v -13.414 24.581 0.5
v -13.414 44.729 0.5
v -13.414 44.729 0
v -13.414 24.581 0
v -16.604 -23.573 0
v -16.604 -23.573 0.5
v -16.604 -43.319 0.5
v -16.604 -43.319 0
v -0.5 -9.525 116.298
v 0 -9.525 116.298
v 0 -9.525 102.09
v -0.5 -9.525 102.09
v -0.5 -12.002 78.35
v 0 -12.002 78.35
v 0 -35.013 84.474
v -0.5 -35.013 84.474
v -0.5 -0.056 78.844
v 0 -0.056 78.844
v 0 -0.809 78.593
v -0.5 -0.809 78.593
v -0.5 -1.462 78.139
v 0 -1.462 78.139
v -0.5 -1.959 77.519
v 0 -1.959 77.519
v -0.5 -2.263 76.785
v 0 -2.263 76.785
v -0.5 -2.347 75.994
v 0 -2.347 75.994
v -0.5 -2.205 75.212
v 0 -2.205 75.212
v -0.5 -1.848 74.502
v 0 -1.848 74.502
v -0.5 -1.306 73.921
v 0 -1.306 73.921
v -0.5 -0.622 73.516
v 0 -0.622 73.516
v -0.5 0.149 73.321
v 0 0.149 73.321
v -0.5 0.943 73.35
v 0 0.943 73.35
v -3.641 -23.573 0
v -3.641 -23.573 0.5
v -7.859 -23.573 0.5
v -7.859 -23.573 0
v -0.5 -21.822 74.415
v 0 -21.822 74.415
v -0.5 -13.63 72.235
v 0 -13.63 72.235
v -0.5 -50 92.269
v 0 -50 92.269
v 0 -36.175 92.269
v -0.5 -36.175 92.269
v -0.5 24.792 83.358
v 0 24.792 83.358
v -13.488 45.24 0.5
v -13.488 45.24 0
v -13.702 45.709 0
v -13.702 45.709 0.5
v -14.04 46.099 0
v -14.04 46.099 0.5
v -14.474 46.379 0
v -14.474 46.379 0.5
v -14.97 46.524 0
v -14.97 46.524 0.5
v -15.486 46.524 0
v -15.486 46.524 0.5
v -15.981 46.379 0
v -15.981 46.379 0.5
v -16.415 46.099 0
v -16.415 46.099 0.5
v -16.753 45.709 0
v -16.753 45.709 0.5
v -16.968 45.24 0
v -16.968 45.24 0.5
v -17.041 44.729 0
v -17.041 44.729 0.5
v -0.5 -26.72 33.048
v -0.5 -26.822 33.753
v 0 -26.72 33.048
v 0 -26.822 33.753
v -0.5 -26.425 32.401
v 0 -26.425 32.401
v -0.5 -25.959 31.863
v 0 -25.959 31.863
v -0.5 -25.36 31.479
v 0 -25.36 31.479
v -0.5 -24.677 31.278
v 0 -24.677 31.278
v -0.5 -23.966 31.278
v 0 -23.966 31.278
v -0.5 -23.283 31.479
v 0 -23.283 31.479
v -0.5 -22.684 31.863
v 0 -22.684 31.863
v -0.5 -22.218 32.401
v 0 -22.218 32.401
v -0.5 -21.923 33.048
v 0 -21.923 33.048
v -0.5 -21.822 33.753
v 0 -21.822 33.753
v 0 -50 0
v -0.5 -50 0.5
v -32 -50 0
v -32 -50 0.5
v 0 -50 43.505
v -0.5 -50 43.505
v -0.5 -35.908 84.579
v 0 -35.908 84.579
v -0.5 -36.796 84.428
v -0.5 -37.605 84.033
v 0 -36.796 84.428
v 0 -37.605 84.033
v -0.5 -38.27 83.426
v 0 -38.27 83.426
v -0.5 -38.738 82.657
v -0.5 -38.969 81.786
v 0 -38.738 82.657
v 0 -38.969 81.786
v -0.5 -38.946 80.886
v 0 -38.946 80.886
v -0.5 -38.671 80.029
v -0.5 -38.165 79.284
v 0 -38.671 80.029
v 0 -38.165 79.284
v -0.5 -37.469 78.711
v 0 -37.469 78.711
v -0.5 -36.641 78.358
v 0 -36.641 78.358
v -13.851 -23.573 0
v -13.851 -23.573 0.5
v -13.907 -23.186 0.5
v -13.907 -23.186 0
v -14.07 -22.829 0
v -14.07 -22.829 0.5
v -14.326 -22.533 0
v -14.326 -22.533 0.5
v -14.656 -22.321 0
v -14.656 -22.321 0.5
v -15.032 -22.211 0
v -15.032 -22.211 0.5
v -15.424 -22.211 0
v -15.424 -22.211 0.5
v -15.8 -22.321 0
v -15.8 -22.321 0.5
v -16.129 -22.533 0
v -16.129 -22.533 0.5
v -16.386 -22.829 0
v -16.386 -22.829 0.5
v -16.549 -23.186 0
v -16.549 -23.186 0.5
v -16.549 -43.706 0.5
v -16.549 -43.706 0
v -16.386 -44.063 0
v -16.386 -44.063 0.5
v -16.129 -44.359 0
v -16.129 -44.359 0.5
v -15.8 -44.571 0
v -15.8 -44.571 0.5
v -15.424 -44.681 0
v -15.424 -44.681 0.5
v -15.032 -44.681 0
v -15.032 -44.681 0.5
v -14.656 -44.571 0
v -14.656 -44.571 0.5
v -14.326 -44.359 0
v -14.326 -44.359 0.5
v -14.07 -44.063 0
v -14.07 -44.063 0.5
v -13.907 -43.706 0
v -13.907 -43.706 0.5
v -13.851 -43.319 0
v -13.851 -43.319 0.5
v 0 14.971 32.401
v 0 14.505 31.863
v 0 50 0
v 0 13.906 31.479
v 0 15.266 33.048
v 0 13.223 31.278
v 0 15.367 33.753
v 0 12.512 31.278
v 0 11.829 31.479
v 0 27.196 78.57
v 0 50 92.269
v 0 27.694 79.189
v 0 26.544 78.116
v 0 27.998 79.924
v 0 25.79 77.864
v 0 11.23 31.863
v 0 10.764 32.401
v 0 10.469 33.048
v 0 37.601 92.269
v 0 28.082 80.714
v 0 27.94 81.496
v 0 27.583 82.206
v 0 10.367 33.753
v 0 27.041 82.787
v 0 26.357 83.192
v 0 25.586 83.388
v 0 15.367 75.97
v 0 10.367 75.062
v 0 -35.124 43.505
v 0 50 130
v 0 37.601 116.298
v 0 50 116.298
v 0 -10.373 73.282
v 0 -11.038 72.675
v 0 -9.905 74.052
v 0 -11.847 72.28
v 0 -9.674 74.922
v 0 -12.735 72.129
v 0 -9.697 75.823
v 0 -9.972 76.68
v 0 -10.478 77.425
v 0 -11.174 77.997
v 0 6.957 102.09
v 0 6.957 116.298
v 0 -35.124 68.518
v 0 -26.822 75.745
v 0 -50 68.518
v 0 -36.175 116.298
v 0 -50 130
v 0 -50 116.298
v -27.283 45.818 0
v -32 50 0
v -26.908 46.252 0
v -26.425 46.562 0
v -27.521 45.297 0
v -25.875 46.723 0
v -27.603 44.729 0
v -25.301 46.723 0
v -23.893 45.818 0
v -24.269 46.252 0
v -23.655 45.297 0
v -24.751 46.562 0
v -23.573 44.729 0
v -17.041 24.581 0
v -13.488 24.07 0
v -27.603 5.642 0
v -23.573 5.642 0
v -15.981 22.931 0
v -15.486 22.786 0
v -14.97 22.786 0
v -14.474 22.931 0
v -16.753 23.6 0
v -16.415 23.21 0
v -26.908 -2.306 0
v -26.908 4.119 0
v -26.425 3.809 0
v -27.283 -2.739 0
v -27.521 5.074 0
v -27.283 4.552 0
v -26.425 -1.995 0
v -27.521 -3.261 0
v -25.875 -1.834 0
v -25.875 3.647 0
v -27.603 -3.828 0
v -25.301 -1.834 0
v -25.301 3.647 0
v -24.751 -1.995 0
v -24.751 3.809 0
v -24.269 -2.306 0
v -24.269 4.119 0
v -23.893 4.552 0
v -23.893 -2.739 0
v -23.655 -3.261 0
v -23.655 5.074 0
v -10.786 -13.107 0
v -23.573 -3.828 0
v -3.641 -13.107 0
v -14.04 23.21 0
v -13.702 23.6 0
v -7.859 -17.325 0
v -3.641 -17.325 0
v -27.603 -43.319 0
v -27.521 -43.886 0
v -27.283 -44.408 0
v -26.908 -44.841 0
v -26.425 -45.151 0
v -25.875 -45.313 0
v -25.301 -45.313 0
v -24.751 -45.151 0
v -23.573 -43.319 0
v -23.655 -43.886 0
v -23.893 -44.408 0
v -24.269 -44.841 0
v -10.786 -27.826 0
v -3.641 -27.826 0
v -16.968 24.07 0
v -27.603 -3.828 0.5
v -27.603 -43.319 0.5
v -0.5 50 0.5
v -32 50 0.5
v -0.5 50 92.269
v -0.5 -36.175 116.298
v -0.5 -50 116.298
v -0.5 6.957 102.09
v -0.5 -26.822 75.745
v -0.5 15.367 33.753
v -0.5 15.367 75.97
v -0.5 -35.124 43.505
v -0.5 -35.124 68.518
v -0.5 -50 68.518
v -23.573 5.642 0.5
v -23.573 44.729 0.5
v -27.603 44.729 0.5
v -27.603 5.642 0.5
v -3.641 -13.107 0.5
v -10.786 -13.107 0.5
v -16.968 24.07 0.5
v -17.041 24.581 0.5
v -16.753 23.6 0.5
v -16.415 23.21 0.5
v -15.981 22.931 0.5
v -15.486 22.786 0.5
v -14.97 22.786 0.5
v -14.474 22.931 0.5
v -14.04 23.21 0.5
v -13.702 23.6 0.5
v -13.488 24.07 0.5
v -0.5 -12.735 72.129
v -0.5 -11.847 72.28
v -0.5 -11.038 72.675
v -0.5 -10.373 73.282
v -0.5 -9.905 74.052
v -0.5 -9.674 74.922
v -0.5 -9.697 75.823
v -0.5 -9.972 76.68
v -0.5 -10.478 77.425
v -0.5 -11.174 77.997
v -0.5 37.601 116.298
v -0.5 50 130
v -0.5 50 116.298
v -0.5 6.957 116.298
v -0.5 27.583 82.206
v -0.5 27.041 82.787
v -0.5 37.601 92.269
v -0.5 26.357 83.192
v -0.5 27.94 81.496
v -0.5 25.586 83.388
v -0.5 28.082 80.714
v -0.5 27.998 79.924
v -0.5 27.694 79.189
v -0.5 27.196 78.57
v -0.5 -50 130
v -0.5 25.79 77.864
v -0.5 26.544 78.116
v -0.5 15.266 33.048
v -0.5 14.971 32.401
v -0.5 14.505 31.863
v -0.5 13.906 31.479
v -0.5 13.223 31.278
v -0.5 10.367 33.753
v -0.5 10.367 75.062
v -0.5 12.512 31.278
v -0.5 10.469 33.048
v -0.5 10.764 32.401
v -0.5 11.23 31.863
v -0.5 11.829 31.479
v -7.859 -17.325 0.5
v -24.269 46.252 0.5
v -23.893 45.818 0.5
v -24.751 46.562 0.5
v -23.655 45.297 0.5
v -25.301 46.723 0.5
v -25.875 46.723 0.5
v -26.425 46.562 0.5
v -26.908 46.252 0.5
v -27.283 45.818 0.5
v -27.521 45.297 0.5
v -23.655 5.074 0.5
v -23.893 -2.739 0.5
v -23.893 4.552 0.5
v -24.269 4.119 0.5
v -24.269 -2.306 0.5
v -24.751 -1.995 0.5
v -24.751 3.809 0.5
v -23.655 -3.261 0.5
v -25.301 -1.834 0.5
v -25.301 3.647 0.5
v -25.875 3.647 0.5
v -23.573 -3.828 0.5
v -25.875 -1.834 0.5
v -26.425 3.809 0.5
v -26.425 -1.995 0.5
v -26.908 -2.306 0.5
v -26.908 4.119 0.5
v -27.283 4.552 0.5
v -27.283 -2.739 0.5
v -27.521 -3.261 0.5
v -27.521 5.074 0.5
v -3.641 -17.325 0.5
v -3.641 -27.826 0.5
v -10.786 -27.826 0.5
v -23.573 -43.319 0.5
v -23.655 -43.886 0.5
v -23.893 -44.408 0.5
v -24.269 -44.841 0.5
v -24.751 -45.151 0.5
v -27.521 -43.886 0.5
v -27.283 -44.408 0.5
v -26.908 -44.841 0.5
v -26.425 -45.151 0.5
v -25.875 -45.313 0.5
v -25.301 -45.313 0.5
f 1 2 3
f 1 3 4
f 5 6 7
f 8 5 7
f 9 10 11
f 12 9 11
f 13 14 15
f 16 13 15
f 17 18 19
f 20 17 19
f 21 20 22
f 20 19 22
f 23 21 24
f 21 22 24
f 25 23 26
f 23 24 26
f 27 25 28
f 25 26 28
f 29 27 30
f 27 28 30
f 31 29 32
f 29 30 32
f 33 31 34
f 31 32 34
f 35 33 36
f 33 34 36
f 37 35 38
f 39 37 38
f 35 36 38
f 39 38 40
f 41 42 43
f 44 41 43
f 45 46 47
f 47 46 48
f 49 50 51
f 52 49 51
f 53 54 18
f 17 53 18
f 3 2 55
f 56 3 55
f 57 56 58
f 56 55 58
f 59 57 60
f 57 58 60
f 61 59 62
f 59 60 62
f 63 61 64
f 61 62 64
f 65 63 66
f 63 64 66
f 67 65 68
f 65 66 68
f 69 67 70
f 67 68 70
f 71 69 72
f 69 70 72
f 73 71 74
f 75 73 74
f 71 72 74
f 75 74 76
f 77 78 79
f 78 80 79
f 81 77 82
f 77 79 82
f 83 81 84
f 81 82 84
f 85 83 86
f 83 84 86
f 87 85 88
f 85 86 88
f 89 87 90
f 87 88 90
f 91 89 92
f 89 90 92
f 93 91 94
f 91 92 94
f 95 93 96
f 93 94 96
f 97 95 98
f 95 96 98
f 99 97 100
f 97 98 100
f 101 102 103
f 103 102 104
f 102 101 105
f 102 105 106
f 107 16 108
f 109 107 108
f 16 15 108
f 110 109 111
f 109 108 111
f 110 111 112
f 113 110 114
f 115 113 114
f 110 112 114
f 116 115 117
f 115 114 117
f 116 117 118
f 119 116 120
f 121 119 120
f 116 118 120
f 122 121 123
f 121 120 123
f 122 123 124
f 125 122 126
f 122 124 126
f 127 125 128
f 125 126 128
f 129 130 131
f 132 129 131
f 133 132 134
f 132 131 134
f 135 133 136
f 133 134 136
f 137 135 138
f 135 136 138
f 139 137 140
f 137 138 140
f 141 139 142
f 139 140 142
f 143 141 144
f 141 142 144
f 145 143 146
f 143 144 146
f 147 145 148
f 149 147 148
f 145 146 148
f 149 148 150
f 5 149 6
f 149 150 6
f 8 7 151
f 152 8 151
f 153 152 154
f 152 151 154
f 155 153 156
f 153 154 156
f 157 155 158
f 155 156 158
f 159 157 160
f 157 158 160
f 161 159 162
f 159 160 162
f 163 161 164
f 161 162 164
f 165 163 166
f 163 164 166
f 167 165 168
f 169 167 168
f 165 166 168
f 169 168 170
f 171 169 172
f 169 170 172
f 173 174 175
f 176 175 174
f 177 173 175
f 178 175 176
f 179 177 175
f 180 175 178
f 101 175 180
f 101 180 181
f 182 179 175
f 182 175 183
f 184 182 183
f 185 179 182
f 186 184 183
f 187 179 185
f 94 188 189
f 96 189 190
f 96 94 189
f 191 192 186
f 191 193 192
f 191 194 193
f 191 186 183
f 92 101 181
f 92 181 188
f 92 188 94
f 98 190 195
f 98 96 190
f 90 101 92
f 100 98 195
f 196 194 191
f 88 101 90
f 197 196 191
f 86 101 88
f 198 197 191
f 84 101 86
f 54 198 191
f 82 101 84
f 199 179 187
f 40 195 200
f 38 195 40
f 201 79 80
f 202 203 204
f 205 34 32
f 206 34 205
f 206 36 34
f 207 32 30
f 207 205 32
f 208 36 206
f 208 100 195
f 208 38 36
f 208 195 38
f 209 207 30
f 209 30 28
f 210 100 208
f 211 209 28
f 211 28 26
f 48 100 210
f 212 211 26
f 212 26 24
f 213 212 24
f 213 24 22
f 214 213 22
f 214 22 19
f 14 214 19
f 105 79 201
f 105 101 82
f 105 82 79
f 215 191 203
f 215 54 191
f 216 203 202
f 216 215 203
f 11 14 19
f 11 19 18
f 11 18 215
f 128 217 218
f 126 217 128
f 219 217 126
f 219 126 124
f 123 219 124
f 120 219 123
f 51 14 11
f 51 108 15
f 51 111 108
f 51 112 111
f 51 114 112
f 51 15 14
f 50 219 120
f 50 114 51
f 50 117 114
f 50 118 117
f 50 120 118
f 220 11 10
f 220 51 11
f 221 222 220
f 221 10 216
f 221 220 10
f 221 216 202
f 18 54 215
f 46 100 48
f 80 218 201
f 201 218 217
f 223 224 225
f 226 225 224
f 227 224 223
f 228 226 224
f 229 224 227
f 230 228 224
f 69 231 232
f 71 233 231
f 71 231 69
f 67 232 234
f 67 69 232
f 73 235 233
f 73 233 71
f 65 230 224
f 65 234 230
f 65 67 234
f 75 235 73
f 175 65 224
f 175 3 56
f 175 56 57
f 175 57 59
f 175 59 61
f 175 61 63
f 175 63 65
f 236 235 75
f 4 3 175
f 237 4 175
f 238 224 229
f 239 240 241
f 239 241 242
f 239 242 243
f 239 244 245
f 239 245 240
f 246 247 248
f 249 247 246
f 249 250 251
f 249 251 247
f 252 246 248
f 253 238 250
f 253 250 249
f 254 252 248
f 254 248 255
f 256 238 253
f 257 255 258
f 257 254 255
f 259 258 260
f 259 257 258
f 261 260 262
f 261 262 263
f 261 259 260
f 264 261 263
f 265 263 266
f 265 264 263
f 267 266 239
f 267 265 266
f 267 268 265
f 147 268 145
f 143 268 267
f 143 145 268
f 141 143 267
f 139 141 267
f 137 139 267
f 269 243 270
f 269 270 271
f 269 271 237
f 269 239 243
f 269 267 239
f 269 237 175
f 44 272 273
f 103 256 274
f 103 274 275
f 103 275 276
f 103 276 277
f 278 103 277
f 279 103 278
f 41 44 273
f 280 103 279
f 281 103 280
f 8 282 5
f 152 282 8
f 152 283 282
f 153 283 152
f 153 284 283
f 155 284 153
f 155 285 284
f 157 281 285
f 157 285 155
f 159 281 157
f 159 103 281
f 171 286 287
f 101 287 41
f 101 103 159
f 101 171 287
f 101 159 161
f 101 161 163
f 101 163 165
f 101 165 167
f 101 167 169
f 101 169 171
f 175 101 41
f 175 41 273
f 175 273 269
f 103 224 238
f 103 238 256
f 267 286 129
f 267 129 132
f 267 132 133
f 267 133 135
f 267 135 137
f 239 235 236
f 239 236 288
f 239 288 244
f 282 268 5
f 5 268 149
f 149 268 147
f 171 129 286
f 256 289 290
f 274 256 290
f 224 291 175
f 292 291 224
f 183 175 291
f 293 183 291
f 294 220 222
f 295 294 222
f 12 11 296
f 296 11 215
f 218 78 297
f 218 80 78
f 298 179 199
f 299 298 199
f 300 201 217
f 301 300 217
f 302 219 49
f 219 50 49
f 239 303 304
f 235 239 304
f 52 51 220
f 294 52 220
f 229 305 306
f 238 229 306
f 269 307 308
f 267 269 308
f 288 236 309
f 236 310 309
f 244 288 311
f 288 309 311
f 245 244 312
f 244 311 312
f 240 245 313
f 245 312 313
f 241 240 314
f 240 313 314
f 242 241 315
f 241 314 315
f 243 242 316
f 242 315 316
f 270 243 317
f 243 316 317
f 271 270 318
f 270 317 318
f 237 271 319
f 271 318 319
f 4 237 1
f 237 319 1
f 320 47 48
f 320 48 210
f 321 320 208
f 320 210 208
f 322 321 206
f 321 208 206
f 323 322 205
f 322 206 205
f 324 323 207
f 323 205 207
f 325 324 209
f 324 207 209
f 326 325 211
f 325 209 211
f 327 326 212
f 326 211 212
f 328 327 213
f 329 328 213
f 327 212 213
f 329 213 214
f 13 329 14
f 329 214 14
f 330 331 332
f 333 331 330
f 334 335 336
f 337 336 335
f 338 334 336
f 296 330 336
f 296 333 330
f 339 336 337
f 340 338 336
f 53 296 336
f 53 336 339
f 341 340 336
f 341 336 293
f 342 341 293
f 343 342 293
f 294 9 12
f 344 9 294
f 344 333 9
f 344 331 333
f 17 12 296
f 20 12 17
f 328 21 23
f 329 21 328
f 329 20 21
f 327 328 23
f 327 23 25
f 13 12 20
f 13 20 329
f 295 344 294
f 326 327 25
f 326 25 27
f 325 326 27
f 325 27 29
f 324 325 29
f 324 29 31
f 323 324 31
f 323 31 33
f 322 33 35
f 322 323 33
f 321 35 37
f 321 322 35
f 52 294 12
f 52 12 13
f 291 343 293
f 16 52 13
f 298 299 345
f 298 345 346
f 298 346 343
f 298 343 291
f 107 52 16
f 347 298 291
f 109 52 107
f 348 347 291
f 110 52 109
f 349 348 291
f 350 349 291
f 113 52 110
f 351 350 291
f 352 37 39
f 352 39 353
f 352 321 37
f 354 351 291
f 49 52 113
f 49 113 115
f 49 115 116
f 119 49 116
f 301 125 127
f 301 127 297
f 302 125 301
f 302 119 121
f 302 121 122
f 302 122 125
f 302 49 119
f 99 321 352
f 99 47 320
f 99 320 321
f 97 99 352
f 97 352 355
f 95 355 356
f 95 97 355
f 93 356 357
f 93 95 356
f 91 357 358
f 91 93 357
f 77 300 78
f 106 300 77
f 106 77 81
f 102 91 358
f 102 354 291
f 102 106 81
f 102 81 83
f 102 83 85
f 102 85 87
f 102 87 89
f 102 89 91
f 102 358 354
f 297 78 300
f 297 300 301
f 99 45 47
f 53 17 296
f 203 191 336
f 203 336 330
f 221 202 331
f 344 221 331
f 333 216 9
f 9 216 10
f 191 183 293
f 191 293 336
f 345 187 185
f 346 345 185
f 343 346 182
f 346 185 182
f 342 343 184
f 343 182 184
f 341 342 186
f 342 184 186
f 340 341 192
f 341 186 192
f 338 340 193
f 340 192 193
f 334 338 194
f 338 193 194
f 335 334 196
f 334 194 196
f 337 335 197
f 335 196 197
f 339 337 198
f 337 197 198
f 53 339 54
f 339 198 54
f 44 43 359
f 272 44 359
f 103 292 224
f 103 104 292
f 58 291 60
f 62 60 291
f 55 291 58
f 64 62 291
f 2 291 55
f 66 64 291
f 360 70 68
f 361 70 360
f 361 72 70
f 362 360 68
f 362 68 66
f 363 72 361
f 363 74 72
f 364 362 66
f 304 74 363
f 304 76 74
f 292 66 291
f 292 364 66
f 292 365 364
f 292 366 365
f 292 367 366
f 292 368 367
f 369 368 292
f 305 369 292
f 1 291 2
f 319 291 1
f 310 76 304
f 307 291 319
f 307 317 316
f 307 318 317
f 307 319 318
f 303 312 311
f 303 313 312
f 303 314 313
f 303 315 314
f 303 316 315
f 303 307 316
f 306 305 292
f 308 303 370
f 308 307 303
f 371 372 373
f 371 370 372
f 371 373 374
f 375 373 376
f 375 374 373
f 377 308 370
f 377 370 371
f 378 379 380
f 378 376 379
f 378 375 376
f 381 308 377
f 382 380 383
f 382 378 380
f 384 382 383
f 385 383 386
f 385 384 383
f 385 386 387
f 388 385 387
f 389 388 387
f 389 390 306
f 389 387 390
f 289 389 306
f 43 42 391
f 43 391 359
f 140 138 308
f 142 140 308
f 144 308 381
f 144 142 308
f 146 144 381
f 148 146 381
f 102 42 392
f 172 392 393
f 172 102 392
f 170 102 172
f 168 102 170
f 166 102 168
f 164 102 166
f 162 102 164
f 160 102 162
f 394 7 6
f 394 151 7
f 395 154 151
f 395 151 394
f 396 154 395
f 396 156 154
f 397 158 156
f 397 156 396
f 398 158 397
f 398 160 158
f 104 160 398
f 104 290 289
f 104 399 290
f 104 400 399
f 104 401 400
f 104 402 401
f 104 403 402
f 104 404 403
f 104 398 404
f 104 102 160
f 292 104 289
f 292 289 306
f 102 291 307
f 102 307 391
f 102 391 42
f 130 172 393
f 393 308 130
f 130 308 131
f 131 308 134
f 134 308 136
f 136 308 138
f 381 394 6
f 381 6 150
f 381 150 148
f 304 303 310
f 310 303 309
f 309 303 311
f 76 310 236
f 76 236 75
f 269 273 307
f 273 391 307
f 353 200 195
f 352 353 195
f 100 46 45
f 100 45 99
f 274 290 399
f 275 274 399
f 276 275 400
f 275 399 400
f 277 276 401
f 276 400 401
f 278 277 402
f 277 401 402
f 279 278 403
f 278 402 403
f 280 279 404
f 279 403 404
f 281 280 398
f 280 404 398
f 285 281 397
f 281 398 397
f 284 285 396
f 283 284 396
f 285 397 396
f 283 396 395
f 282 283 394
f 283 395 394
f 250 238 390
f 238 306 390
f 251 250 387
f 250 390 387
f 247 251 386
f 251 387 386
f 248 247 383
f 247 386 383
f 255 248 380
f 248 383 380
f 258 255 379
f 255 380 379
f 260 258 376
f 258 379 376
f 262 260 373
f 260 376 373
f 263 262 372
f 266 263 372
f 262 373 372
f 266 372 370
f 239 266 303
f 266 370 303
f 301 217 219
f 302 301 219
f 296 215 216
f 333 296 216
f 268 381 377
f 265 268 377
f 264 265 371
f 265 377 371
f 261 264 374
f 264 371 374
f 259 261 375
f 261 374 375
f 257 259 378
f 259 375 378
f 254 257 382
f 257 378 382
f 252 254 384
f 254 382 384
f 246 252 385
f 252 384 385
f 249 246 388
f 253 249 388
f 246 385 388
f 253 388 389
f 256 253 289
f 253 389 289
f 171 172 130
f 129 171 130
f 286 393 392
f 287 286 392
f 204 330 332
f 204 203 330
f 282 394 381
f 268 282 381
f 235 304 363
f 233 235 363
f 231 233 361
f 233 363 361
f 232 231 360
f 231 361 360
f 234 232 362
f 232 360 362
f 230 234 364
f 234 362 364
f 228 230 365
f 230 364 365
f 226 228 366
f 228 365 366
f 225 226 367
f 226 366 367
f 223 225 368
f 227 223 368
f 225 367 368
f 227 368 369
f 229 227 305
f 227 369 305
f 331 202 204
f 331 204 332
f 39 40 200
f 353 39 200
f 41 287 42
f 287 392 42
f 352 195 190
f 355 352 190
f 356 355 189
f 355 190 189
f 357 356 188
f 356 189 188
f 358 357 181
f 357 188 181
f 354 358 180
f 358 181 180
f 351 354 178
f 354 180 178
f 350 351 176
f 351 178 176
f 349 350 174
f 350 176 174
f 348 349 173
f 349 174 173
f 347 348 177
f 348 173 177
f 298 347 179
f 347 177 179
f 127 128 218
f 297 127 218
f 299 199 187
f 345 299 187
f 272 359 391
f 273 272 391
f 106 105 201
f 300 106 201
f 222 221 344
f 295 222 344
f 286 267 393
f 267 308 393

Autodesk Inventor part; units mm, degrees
ref_plane "YZ Plane" through (0, 0, 0) normal (1, 0, 0) x (0, 1, 0)
ref_plane "XZ Plane" through (0, 0, 0) normal (0, 1, 0) x (-1, 0, 0)
ref_plane "XY Plane" through (0, 0, 0) normal (0, 0, 1) x (1, 0, 0)
sketch "Sketch1" plane through (0, 0, 0) normal (0, 1, 0) x (-1, 0, 0)
  line L0 (0, 0) -> (0, 130)
  line L1 (0, 130) -> (0.5, 130)
  line L2 (0.5, 130) -> (0.5, 0.5)
  line L3 (0.5, 0.5) -> (32, 0.5)
  line L4 (32, 0.5) -> (32, 0)
  line L5 (32, 0) -> (0, 0)
  dimension "d0" = 0.5
  dimension "d1" = 130
  dimension "d2" = 32
extrude "Extrusion1" add sketch "Sketch1" along normal mid plane 100
sketch "Sketch2" plane through (0, -50, 0) normal (1, 0, 0) x (0, 0, -1)
  line L0 (-116.2978, 40.4754) -> (-102.0897, 40.4754)
  line L1 (-102.0897, 40.4754) -> (-102.0897, 56.9569)
  line L2 (-102.0897, 56.9569) -> (-116.2978, 56.9569)
  line L3 (-116.2978, 56.9569) -> (-116.2978, 40.4754)
  line L4 (-116.2978, -0.6285) -> (-92.269, -0.6285)
  line L5 (-92.269, -0.6285) -> (-92.269, 13.8246)
  line L6 (-92.269, 13.8246) -> (-116.2978, 13.8246)
  line L7 (-116.2978, 13.8246) -> (-116.2978, -0.6285)
  line L8 (-68.5175, -0.6285) -> (-43.5049, -0.6285)
  line L9 (-43.5049, -0.6285) -> (-43.5049, 14.8755)
  line L10 (-43.5049, 14.8755) -> (-68.5175, 14.8755)
  line L11 (-68.5175, 14.8755) -> (-68.5175, -0.6285)
  line L12 (-116.2978, 101.3011) -> (-92.269, 101.3011)
  line L13 (-92.269, 101.3011) -> (-92.269, 87.6013)
  line L14 (-92.269, 87.6013) -> (-116.2978, 87.6013)
  line L15 (-116.2978, 87.6013) -> (-116.2978, 101.3011)
  line L16 (-33.7527, 25.6785) -> (-78.3542, 25.6785) construction
  line L17 (-33.7527, 23.1785) -> (-78.3542, 23.1785)
  line L18 (-78.3542, 28.1785) -> (-33.7527, 28.1785)
  arc A0 (-33.7527, 23.1785) -> (-33.7527, 28.1785) centre (-33.7527, 25.6785) ccw
  arc A1 (-78.3542, 28.1785) -> (-78.3542, 23.1785) centre (-78.3542, 25.6785) ccw
  line L19 (-33.7526, 62.8674) -> (-78.3542, 62.8674) construction
  line L20 (-33.7526, 65.3674) -> (-78.3542, 65.3674)
  line L21 (-78.3542, 60.3674) -> (-33.7526, 60.3674)
  arc A2 (-33.7526, 60.3674) -> (-33.7526, 65.3674) centre (-33.7526, 62.8674) ccw
  arc A3 (-78.3542, 65.3674) -> (-78.3542, 60.3674) centre (-78.3542, 62.8674) ccw
  line L22 (-76.0973, 50.4436) -> (-80.6111, 75.2913) construction
  line L23 (-73.3501, 50.9427) -> (-77.8639, 75.7903)
  line L24 (-83.3583, 74.7922) -> (-78.8445, 49.9445)
  arc A4 (-78.8445, 49.9445) -> (-73.3501, 50.9427) centre (-76.0973, 50.4436) ccw
  arc A5 (-77.8639, 75.7903) -> (-83.3583, 74.7922) centre (-80.6111, 75.2913) ccw
  line L25 (-75.2925, 37.1839) -> (-81.416, 14.1731) construction
  line L26 (-78.3502, 37.9976) -> (-84.4737, 14.9868)
  line L27 (-78.3582, 13.3594) -> (-72.2347, 36.3702)
  arc A6 (-72.2347, 36.3702) -> (-78.3502, 37.9976) centre (-75.2925, 37.1839) ccw
  arc A7 (-84.4737, 14.9868) -> (-78.3582, 13.3594) centre (-81.416, 14.1731) ccw
  point P0 (0, 50)
  point P1 (-56.0534, 25.6785)
  point P2 (-56.0534, 62.8674)
  dimension "d16" = 2.5
extrude "Extrusion2" cut sketch "Sketch2" against normal blind 100
sketch "Sketch5" plane through (-32, 50, 0.5) normal (0, 0, 1) x (1, 0, 0)
  line L0 (6.4118, -5.271) -> (6.4118, -44.3585) construction
  line L1 (4.397, -5.271) -> (4.397, -44.3585)
  line L2 (8.4266, -44.3585) -> (8.4266, -5.271)
  arc A0 (8.4266, -5.271) -> (4.397, -5.271) centre (6.4118, -5.271) ccw
  arc A1 (4.397, -44.3585) -> (8.4266, -44.3585) centre (6.4118, -44.3585) ccw
  line L3 (6.4118, -53.8282) -> (6.4118, -93.3186) construction
  line L4 (4.397, -53.8282) -> (4.397, -93.3186)
  line L5 (8.4266, -93.3186) -> (8.4266, -53.8282)
  arc A2 (8.4266, -53.8282) -> (4.397, -53.8282) centre (6.4118, -53.8282) ccw
  arc A3 (4.397, -93.3186) -> (8.4266, -93.3186) centre (6.4118, -93.3186) ccw
  line L6 (16.7722, -25.4192) -> (16.7722, -5.271) construction
  line L7 (14.9589, -25.4192) -> (14.9589, -5.271)
  line L8 (18.5856, -5.271) -> (18.5856, -25.4192)
  arc A4 (14.9589, -25.4192) -> (18.5856, -25.4192) centre (16.7722, -25.4192) ccw
  arc A5 (18.5856, -5.271) -> (14.9589, -5.271) centre (16.7722, -5.271) ccw
  line L9 (16.7722, -73.5734) -> (16.7722, -93.3186) construction
  line L10 (15.3955, -73.5734) -> (15.3955, -93.3186)
  line L11 (18.1489, -93.3186) -> (18.1489, -73.5734)
  arc A6 (18.1489, -73.5734) -> (15.3955, -73.5734) centre (16.7722, -73.5734) ccw
  arc A7 (15.3955, -93.3186) -> (18.1489, -93.3186) centre (16.7722, -93.3186) ccw
  line L12 (28.3587, -63.1068) -> (21.2143, -63.1068)
  line L13 (21.2143, -63.1068) -> (21.2143, -77.826)
  line L14 (21.2143, -77.826) -> (28.3587, -77.826)
  line L15 (28.3587, -77.826) -> (28.3587, -73.5734)
  line L16 (28.3587, -73.5734) -> (24.1409, -73.5734)
  line L17 (24.1409, -73.5734) -> (24.1409, -67.3246)
  line L18 (24.1409, -67.3246) -> (28.3587, -67.3246)
  line L19 (28.3587, -67.3246) -> (28.3587, -63.1068)
  point P0 (32, -50)
  point P1 (6.4118, -24.8148)
  point P2 (6.4118, -73.5734)
  point P3 (16.7722, -15.3451)
  point P4 (16.7722, -83.446)
extrude "Extrusion5" cut sketch "Sketch5" against normal blind 10
properties part number "Platina lateral interna 2" material "Steel"
